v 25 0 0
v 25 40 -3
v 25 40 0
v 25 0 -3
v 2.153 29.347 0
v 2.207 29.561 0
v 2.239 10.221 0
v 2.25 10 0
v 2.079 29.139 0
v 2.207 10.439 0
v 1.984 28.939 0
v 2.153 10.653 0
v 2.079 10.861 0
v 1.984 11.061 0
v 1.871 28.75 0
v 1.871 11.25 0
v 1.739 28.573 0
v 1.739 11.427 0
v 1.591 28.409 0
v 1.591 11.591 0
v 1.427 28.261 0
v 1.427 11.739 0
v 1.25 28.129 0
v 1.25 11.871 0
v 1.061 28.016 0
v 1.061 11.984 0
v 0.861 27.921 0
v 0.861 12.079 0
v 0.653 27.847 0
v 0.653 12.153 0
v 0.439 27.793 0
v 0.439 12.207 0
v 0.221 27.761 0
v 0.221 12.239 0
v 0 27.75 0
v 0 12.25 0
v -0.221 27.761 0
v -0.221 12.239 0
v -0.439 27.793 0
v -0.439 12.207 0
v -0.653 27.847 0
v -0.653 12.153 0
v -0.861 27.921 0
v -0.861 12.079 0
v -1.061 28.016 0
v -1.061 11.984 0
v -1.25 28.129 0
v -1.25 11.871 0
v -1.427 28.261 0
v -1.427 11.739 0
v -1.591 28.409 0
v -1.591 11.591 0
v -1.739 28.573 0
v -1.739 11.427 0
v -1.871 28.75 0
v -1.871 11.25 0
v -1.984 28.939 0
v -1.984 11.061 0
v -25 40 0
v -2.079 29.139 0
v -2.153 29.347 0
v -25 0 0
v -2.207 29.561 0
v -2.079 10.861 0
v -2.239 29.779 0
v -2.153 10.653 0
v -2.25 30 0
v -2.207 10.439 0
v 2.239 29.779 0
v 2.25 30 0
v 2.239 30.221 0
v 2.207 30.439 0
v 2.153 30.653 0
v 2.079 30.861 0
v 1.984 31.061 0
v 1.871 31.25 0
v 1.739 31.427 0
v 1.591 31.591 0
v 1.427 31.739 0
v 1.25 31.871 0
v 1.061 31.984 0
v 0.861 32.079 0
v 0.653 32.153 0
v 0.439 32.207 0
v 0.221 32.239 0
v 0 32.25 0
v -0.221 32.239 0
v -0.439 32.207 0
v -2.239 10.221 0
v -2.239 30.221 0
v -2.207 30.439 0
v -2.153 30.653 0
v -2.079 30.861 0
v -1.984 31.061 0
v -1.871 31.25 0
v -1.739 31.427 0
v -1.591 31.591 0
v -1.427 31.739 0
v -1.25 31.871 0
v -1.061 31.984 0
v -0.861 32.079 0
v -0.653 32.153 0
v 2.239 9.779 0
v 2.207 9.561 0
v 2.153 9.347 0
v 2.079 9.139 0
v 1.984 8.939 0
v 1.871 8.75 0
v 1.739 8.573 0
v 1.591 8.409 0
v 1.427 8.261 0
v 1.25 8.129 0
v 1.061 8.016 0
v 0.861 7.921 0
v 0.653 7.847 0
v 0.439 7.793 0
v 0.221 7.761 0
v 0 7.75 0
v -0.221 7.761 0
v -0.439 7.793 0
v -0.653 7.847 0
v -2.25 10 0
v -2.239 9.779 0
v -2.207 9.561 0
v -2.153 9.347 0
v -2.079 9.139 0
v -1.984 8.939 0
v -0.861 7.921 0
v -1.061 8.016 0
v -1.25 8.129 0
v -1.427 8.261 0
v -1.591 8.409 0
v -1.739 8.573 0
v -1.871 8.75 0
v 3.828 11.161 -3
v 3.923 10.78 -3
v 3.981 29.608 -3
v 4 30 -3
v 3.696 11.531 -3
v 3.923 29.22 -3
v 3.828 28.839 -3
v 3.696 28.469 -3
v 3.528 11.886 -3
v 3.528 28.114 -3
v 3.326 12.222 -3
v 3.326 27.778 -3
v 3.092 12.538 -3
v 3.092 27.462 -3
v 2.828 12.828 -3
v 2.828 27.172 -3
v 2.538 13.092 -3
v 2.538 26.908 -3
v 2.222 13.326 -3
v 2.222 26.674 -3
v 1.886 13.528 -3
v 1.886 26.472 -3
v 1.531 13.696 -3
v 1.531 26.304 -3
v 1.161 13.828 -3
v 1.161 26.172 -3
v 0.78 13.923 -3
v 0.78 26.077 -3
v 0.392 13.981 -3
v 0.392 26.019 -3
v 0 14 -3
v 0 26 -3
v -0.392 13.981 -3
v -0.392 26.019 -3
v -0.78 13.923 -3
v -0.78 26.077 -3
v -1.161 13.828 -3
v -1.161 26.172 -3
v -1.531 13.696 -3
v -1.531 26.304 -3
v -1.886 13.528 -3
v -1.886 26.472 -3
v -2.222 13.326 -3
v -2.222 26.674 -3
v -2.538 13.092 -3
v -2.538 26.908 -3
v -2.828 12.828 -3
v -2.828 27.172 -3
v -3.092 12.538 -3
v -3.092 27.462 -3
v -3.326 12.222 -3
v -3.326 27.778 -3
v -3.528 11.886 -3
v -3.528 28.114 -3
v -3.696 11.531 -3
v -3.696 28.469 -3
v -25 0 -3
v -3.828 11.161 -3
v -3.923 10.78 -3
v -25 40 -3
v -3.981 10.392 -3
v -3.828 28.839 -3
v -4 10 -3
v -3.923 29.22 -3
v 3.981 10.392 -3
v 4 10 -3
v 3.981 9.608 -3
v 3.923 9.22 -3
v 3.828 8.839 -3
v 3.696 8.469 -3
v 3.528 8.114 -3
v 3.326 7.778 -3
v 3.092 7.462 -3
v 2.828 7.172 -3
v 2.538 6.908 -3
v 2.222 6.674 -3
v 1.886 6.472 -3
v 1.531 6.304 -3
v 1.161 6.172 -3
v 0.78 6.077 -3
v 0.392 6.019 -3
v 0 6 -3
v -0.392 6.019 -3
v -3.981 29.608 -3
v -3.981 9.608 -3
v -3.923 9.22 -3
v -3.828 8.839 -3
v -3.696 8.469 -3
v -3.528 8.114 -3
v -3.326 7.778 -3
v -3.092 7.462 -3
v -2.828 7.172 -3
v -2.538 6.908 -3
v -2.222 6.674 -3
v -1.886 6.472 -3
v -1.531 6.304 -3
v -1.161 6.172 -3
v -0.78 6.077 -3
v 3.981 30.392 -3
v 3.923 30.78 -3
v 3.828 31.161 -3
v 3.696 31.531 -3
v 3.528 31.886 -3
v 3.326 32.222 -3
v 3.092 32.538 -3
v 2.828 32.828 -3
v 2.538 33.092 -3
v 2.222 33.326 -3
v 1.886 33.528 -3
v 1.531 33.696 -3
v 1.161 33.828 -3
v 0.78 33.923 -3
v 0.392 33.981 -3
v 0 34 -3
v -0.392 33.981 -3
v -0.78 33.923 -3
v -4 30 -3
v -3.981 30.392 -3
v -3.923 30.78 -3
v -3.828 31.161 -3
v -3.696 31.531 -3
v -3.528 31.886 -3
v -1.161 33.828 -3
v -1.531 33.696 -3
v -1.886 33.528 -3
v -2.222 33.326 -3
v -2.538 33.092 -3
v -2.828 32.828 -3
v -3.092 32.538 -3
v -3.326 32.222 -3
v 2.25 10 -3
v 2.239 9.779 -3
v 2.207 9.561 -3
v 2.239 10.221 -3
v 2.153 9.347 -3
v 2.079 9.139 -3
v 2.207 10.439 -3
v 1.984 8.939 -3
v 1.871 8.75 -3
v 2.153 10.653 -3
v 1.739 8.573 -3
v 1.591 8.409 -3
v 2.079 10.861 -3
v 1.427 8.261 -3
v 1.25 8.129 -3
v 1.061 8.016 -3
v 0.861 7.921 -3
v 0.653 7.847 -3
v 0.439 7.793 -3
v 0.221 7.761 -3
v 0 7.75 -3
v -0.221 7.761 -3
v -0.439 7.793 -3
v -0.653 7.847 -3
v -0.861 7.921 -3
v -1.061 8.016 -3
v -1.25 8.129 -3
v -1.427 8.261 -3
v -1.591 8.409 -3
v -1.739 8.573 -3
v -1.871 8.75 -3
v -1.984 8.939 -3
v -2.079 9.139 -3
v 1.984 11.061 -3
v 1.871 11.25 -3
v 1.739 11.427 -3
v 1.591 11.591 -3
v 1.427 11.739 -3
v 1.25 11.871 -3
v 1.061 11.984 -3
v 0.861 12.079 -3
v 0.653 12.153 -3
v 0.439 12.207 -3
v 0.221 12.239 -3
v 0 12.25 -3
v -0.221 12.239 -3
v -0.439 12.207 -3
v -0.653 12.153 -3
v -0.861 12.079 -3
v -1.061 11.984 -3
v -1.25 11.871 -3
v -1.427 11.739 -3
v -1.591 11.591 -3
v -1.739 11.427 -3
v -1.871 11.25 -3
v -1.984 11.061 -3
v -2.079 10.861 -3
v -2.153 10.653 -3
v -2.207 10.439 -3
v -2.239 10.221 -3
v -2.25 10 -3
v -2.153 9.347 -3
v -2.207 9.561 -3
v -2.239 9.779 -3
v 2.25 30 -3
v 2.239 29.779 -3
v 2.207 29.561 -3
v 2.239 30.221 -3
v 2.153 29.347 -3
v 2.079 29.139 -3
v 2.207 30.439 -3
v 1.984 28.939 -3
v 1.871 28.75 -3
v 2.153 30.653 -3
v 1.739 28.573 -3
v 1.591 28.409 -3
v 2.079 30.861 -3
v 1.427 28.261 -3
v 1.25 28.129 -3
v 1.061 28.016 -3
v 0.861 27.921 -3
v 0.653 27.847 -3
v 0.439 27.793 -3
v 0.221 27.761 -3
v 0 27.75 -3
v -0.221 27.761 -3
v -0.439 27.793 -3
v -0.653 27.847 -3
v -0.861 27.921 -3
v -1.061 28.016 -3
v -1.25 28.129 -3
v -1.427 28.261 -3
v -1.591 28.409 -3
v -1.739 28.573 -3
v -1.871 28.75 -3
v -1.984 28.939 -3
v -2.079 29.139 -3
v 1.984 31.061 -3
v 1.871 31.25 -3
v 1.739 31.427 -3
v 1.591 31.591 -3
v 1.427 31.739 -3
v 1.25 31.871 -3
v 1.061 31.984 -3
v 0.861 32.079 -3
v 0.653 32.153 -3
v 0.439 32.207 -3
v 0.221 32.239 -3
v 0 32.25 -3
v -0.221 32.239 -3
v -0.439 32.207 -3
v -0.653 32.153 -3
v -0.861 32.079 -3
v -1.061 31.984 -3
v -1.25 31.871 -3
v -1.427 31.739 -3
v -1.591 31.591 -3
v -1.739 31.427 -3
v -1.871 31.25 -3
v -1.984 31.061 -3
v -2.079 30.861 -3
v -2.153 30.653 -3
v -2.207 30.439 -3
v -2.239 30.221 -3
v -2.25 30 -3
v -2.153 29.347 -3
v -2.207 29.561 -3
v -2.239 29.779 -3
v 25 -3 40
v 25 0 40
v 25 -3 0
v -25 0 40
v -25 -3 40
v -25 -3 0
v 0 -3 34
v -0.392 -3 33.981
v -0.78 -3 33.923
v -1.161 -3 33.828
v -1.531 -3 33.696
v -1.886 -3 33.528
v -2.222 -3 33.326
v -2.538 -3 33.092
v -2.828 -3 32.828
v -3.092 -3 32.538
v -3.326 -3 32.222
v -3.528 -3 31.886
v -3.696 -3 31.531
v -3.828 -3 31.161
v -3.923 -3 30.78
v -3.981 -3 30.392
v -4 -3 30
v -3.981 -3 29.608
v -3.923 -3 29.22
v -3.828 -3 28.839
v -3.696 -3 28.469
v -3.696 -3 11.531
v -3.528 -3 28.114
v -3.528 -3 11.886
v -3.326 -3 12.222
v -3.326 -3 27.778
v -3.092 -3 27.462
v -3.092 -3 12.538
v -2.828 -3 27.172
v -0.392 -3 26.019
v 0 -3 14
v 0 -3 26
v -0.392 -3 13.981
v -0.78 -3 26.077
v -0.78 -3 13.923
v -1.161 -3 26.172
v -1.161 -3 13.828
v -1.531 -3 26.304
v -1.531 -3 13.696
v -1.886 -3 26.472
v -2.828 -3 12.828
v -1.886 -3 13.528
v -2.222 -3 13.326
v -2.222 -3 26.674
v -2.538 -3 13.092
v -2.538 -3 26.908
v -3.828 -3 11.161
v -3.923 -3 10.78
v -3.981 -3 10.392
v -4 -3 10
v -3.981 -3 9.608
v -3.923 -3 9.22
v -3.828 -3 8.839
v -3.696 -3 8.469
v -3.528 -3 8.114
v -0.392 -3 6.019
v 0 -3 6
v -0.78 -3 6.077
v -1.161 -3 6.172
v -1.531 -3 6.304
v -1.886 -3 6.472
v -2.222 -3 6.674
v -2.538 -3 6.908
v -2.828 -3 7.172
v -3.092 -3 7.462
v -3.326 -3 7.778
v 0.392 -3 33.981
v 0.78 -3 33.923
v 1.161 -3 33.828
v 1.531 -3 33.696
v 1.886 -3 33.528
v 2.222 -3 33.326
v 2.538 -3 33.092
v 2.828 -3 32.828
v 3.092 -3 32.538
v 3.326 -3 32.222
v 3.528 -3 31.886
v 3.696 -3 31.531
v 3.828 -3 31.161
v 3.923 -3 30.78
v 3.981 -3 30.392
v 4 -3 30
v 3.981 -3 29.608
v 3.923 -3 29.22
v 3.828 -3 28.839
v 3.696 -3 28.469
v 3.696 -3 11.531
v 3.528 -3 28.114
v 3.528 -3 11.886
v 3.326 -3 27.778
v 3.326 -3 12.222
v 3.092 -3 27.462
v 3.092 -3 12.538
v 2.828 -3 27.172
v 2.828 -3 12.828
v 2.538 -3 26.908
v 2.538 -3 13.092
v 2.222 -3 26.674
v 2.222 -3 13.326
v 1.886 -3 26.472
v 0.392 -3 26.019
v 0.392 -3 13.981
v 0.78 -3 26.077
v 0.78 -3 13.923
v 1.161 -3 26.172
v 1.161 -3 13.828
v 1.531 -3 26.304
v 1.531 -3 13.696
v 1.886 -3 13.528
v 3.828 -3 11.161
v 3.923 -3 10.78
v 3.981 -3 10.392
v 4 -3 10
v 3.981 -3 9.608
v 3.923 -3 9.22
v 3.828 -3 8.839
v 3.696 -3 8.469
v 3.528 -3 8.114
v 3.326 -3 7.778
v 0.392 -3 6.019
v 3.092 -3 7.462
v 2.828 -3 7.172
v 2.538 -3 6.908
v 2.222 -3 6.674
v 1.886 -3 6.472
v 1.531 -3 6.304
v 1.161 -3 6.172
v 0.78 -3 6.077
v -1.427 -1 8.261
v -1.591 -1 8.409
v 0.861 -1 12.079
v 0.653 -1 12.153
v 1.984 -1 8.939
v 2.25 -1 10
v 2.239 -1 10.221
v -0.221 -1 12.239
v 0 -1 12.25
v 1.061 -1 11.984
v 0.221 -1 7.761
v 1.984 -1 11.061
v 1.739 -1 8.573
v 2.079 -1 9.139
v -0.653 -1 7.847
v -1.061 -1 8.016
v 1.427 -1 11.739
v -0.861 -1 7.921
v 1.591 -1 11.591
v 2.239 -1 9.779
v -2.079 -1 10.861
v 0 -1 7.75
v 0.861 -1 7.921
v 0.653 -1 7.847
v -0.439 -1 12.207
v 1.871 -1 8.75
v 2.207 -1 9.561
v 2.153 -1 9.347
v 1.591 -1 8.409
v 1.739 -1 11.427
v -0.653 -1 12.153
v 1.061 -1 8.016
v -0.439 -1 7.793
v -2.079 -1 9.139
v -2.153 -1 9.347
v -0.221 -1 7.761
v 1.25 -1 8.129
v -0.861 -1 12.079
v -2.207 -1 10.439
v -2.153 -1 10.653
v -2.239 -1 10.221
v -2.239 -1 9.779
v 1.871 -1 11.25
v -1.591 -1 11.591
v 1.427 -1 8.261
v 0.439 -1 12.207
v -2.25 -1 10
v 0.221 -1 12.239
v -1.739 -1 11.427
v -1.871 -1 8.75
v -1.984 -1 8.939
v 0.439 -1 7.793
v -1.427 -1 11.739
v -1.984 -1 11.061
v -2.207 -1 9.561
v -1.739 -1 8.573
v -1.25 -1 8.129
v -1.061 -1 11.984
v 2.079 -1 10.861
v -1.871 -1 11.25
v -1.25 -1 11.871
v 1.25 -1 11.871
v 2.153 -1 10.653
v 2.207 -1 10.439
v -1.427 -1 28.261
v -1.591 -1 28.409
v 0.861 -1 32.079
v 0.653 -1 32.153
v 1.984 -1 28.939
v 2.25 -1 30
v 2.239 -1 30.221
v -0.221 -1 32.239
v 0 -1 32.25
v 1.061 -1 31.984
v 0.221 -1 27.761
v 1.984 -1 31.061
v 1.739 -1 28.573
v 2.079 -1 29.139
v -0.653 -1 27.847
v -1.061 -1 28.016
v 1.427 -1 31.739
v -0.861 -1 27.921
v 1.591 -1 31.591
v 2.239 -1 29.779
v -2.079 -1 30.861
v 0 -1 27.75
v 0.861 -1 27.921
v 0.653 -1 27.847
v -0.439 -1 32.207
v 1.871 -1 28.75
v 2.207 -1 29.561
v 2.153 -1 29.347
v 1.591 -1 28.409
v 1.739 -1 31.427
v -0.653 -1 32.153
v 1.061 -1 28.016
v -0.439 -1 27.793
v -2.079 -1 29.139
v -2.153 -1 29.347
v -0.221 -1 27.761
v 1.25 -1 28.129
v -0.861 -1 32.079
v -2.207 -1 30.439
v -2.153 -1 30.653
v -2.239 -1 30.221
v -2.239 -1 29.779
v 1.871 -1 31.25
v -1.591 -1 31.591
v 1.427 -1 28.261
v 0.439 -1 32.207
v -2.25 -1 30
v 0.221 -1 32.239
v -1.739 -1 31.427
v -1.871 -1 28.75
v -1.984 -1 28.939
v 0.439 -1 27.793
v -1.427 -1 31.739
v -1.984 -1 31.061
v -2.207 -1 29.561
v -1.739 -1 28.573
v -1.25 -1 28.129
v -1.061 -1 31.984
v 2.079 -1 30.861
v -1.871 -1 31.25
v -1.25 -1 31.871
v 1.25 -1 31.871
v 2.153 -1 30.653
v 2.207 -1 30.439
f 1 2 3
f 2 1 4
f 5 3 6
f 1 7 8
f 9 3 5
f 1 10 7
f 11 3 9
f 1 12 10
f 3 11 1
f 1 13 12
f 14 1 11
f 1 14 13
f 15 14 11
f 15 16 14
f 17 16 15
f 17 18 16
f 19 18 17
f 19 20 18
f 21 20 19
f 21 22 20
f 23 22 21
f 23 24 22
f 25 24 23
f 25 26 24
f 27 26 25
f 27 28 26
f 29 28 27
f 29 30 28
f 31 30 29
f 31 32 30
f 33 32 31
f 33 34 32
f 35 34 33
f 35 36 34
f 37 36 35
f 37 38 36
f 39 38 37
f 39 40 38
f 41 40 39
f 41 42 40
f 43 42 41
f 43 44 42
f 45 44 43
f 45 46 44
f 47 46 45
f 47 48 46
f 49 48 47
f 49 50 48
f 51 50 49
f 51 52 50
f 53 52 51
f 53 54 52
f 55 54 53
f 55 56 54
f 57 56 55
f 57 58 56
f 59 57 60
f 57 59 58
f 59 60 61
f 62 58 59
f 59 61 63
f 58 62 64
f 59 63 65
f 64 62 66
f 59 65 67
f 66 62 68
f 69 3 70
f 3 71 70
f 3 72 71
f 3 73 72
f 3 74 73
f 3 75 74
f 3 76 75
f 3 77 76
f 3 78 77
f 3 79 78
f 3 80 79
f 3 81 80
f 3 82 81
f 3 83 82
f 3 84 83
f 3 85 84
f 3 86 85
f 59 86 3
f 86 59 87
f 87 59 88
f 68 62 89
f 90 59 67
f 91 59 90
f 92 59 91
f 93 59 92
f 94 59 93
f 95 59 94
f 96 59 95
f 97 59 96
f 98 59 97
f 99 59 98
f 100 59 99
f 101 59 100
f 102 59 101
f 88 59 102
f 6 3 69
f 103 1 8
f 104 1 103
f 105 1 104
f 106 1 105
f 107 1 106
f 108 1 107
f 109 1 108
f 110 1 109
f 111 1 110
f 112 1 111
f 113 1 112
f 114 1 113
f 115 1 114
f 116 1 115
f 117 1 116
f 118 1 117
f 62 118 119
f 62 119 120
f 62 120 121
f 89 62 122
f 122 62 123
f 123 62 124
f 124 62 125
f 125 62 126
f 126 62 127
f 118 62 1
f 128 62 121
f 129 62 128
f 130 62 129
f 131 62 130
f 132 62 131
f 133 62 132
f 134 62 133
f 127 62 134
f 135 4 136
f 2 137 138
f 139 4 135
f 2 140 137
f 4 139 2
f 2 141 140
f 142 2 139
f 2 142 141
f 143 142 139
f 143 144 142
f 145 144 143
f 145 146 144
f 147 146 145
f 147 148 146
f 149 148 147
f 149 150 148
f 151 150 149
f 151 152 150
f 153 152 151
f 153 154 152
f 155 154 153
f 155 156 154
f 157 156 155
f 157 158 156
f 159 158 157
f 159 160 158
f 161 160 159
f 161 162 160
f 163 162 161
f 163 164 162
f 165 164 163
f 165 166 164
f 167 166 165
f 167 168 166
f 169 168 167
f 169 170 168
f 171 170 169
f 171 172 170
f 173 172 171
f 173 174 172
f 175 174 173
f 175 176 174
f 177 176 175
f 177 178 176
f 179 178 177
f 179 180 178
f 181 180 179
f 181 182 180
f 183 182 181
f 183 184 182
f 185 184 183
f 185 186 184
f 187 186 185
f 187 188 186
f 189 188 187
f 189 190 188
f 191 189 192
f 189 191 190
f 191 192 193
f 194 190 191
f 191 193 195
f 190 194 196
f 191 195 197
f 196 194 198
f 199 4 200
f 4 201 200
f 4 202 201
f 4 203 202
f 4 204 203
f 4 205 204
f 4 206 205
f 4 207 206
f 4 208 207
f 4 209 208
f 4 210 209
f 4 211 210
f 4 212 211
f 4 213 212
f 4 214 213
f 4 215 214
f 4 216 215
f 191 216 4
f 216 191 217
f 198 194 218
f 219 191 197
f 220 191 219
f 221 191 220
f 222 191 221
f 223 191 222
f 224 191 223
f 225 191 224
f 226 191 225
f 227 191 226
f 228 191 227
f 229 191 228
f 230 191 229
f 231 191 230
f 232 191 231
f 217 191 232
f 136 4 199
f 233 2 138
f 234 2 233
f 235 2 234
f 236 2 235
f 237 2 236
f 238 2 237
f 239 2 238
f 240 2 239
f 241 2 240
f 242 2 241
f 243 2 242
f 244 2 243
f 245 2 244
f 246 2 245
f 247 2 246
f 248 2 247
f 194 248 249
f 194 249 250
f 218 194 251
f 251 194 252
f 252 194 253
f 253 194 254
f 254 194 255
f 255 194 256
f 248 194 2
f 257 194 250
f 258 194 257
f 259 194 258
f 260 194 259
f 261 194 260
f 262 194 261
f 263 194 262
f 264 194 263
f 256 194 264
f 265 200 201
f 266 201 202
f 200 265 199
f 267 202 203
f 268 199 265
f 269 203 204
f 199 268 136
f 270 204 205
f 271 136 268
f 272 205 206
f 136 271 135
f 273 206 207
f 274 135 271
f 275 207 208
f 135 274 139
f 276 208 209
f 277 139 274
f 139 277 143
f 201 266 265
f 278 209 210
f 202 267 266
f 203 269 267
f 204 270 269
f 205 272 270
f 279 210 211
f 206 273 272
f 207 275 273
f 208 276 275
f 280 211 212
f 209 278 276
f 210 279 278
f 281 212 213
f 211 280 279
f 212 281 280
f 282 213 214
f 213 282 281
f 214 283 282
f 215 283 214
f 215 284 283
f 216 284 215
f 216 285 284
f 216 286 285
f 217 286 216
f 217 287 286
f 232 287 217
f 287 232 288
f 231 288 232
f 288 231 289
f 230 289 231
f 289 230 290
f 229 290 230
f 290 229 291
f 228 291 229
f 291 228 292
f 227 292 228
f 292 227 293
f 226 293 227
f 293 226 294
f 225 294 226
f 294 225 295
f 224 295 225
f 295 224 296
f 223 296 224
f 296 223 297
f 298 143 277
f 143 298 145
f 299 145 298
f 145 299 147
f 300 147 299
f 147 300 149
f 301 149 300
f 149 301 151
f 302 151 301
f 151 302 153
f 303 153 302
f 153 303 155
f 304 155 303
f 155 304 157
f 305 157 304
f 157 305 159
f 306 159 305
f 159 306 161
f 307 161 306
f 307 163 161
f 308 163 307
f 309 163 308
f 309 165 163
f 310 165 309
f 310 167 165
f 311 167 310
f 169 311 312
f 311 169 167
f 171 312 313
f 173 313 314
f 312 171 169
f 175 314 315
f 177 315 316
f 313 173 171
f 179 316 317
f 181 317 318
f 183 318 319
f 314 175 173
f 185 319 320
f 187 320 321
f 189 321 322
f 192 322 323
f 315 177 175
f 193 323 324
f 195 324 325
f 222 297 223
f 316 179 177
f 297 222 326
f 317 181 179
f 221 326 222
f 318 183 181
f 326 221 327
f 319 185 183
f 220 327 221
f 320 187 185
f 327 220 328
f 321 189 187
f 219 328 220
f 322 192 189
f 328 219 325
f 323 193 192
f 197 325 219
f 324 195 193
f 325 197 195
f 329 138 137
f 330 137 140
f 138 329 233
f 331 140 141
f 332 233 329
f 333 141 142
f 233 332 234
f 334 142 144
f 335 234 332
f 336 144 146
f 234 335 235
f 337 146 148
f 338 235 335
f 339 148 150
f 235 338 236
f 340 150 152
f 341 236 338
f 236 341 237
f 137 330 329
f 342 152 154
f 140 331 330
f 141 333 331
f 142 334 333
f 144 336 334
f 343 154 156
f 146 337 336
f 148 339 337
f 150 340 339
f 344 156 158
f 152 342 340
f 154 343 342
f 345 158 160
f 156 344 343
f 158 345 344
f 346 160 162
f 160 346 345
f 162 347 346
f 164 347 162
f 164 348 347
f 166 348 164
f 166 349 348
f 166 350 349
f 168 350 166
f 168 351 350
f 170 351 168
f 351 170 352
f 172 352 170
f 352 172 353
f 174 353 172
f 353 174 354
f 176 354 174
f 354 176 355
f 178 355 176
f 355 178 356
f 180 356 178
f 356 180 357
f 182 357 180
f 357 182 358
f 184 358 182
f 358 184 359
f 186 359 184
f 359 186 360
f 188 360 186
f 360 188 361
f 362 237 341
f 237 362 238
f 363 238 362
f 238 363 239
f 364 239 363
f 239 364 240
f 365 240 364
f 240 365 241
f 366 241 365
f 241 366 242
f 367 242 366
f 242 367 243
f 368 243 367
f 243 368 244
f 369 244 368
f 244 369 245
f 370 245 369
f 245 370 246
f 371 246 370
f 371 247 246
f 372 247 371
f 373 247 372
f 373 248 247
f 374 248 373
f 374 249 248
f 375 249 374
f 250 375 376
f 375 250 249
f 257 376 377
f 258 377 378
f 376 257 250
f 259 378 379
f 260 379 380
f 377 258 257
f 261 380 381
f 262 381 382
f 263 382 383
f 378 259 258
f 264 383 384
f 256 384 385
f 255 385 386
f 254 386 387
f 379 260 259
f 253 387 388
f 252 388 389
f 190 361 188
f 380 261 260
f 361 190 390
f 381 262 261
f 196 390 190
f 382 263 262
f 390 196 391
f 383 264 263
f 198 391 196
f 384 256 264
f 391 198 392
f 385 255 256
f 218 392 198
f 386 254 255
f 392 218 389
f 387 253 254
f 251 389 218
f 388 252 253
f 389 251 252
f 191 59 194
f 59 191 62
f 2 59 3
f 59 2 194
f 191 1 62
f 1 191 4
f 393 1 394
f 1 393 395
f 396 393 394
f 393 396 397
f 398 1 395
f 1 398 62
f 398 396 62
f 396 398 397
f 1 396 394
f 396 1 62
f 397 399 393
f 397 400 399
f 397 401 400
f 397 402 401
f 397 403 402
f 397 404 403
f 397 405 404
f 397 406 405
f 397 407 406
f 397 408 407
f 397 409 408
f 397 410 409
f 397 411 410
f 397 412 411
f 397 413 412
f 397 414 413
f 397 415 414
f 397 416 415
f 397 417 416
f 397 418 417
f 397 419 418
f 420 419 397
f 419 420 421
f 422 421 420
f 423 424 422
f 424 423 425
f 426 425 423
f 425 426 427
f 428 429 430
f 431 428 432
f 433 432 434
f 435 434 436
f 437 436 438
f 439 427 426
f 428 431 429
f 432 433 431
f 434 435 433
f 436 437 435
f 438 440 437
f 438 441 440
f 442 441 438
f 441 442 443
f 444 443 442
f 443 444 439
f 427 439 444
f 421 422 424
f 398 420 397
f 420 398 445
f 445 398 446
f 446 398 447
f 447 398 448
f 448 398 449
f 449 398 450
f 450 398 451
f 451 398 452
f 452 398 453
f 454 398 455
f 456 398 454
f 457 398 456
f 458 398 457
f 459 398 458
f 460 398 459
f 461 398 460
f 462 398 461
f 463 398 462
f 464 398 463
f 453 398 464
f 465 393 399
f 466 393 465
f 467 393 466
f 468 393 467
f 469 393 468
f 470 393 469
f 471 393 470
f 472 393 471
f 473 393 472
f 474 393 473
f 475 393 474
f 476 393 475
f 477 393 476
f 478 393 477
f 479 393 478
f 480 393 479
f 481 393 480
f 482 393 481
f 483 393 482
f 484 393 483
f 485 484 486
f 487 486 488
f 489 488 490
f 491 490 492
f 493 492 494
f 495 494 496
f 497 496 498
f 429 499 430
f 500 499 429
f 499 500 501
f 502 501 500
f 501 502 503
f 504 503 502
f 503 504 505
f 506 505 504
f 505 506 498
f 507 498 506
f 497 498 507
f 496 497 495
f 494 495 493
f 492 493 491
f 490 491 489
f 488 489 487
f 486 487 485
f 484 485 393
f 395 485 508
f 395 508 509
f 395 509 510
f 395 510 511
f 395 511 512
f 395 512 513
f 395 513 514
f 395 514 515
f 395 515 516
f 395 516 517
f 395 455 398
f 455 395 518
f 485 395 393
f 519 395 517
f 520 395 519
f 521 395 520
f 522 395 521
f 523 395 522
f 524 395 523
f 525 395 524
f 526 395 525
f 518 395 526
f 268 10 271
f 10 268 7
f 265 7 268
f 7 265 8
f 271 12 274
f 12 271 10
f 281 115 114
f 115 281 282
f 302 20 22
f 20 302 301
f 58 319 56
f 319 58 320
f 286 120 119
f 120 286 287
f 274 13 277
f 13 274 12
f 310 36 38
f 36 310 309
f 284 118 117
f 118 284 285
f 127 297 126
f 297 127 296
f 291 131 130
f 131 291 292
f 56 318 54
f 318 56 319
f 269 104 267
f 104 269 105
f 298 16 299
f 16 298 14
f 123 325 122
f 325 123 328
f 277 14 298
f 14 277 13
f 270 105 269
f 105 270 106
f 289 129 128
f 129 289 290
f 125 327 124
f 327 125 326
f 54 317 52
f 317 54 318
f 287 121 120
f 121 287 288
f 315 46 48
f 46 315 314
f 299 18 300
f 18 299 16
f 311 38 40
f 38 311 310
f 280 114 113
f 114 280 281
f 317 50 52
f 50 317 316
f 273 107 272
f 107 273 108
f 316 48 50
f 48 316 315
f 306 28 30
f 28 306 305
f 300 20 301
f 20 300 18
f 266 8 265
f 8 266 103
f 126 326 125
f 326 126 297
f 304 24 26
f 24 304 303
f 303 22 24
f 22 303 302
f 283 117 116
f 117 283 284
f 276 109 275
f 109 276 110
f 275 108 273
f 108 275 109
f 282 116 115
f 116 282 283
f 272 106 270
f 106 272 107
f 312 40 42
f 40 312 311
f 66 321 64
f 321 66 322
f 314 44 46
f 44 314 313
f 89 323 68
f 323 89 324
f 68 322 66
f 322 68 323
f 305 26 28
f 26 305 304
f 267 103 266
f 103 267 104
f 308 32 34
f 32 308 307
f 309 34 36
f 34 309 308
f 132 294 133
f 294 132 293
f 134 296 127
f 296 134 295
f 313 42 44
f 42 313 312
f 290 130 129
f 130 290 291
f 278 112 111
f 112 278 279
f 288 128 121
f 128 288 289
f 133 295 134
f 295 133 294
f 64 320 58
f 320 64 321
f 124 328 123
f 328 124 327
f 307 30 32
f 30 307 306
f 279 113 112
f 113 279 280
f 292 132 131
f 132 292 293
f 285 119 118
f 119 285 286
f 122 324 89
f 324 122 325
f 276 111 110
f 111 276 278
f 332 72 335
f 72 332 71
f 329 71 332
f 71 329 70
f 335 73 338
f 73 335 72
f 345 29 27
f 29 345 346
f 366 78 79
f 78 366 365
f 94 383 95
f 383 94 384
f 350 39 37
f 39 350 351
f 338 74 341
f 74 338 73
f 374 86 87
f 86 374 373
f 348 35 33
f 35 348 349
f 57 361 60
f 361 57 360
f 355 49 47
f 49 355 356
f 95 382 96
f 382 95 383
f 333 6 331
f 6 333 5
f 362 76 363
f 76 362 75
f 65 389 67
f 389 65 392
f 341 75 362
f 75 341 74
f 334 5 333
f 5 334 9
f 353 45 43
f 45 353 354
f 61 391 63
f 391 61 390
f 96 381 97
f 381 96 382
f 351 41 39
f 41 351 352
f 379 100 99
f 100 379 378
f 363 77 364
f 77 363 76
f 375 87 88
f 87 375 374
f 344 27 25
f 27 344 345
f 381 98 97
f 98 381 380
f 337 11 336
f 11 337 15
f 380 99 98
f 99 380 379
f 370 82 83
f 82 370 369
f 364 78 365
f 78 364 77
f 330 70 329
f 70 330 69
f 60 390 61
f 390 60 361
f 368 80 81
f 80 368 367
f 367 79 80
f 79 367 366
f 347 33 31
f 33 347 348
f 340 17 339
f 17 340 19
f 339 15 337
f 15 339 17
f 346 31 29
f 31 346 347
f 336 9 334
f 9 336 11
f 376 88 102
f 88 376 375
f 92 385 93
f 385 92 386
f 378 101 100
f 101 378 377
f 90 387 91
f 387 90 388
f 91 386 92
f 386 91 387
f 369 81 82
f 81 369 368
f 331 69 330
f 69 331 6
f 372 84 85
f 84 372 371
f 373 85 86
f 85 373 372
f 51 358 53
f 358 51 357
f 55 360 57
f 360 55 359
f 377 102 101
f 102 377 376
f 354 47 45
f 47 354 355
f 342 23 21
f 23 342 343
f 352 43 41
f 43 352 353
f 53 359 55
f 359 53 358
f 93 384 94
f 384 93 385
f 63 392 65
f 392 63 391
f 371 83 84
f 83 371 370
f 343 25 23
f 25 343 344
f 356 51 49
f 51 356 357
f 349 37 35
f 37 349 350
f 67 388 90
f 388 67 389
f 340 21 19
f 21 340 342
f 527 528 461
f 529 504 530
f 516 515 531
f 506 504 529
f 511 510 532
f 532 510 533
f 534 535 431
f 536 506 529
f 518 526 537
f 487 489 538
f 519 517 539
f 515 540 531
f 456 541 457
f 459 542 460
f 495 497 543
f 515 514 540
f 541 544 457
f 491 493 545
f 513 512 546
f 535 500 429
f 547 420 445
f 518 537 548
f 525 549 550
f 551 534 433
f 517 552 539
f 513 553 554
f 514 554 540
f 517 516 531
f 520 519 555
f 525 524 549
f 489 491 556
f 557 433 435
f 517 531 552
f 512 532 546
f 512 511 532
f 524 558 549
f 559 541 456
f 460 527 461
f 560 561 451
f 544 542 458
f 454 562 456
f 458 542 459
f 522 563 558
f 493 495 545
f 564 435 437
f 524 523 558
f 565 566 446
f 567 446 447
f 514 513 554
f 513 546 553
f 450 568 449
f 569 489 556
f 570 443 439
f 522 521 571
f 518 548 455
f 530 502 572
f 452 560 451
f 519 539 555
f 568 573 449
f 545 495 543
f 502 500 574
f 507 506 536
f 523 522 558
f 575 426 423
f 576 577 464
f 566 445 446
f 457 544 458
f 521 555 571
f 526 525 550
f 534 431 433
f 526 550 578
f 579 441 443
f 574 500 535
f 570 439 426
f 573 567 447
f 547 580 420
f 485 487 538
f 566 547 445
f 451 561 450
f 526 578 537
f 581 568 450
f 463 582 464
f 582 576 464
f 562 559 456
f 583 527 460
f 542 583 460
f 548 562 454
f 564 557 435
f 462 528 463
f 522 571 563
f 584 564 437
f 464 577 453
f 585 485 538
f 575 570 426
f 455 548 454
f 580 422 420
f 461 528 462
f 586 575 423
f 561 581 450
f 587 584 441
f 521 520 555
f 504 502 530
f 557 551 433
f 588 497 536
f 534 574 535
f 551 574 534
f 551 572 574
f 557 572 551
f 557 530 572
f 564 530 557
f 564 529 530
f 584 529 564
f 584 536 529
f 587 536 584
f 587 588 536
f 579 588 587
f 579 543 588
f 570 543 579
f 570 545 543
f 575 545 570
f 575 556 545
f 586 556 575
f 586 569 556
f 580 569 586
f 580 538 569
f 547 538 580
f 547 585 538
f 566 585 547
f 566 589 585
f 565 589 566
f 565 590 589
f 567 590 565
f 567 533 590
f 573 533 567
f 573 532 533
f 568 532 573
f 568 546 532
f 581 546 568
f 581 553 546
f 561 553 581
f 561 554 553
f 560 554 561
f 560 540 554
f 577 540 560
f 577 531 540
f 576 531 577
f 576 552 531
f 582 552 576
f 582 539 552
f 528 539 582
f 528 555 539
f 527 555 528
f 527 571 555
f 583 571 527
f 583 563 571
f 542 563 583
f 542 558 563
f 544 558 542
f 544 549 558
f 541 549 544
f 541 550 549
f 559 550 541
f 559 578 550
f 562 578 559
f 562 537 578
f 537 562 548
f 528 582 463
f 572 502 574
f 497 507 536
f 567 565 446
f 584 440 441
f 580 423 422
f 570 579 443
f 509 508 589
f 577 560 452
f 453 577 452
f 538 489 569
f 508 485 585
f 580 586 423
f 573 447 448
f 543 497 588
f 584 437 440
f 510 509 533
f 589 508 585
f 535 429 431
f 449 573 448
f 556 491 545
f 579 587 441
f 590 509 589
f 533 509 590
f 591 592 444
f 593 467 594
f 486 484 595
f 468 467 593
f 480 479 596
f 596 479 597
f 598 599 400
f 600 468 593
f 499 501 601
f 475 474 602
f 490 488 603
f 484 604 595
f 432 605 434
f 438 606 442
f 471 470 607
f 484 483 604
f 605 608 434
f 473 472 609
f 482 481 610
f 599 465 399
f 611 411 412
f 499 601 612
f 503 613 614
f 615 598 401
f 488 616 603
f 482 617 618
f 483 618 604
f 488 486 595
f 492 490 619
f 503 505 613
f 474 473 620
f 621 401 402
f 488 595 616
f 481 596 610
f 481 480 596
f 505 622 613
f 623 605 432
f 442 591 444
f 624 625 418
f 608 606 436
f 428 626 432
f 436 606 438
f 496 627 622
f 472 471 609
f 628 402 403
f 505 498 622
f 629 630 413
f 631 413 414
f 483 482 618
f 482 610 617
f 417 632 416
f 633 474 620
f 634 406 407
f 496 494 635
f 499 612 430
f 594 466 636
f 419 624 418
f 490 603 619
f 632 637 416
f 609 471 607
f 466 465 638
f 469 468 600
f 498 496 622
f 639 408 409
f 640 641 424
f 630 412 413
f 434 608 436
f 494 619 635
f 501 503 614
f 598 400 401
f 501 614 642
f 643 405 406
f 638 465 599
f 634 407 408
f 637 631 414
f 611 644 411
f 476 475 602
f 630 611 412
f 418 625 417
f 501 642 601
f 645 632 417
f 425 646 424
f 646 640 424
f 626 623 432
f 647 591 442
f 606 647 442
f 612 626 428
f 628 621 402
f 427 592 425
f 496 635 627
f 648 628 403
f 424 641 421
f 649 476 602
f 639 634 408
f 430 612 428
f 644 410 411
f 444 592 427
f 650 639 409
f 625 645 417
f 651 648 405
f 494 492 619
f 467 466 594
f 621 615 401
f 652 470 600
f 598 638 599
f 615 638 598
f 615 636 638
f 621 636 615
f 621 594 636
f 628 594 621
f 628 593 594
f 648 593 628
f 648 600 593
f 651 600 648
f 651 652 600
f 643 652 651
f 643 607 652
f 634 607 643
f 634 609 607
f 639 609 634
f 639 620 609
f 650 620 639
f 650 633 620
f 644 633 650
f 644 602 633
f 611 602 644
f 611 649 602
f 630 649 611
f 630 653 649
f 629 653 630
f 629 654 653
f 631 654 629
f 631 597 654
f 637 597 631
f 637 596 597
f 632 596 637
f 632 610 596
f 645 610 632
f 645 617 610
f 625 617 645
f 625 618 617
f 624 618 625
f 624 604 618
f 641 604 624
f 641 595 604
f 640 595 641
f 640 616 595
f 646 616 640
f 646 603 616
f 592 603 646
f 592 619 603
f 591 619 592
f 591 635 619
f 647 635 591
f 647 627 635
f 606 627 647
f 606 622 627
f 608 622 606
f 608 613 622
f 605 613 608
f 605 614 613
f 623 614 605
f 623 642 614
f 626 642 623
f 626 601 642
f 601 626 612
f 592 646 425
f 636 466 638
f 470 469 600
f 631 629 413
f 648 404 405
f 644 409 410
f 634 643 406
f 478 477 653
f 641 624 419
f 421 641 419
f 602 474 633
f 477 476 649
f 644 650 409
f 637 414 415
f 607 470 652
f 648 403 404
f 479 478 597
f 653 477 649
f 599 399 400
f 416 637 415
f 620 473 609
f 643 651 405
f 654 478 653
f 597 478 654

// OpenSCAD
// Parameters
width = 50;          // 幅
depth = 40;          // 奥行き (水平面)
height = 40;         // 高さ (垂直面)
thickness = 3;       // 板厚
hole_d = 4.5;        // 貫通穴径 (M4)
cs_d = 8;            // 皿座面径
cs_h = 2;            // 皿座面深さ
offset = 10;         // 縁からの距離
$fn = 64;            // 円の分割数

// 皿穴モジュール
module countersunk_hole() {
    union() {
        // 貫通穴 (板厚より少し長く設定して確実に貫通させる)
        cylinder(d = hole_d, h = thickness + 1);
        // 皿座面 (外側に向かって広がる形状)
        translate([0, 0, -cs_h])
            cylinder(d1 = hole_d, d2 = cs_d, h = cs_h);
    }
}

difference() {
    // 本体形状
    union() {
        // 水平面 (原点から+Y方向に伸び、厚み方向は-Z)
        translate([-width/2, 0, -thickness])
            cube([width, depth, thickness]);
        
        // 垂直面 (原点から+Z方向に伸び、厚み方向は-Y)
        translate([-width/2, -thickness, 0])
            cube([width, thickness, height]);
    }

    // 皿穴の配置
    // 水平面の穴 (底面 Z = -thickness が外側)
    translate([0, offset, -thickness])
        countersunk_hole();
    translate([0, depth - offset, -thickness])
        countersunk_hole();

    // 垂直面の穴 (背面 Y = -thickness が外側)
    // X軸周りに90度回転させて配置
    translate([0, -thickness, offset])
        rotate([90, 0, 0])
            countersunk_hole();
    translate([0, -thickness, height - offset])
        rotate([90, 0, 0])
            countersunk_hole();
}
